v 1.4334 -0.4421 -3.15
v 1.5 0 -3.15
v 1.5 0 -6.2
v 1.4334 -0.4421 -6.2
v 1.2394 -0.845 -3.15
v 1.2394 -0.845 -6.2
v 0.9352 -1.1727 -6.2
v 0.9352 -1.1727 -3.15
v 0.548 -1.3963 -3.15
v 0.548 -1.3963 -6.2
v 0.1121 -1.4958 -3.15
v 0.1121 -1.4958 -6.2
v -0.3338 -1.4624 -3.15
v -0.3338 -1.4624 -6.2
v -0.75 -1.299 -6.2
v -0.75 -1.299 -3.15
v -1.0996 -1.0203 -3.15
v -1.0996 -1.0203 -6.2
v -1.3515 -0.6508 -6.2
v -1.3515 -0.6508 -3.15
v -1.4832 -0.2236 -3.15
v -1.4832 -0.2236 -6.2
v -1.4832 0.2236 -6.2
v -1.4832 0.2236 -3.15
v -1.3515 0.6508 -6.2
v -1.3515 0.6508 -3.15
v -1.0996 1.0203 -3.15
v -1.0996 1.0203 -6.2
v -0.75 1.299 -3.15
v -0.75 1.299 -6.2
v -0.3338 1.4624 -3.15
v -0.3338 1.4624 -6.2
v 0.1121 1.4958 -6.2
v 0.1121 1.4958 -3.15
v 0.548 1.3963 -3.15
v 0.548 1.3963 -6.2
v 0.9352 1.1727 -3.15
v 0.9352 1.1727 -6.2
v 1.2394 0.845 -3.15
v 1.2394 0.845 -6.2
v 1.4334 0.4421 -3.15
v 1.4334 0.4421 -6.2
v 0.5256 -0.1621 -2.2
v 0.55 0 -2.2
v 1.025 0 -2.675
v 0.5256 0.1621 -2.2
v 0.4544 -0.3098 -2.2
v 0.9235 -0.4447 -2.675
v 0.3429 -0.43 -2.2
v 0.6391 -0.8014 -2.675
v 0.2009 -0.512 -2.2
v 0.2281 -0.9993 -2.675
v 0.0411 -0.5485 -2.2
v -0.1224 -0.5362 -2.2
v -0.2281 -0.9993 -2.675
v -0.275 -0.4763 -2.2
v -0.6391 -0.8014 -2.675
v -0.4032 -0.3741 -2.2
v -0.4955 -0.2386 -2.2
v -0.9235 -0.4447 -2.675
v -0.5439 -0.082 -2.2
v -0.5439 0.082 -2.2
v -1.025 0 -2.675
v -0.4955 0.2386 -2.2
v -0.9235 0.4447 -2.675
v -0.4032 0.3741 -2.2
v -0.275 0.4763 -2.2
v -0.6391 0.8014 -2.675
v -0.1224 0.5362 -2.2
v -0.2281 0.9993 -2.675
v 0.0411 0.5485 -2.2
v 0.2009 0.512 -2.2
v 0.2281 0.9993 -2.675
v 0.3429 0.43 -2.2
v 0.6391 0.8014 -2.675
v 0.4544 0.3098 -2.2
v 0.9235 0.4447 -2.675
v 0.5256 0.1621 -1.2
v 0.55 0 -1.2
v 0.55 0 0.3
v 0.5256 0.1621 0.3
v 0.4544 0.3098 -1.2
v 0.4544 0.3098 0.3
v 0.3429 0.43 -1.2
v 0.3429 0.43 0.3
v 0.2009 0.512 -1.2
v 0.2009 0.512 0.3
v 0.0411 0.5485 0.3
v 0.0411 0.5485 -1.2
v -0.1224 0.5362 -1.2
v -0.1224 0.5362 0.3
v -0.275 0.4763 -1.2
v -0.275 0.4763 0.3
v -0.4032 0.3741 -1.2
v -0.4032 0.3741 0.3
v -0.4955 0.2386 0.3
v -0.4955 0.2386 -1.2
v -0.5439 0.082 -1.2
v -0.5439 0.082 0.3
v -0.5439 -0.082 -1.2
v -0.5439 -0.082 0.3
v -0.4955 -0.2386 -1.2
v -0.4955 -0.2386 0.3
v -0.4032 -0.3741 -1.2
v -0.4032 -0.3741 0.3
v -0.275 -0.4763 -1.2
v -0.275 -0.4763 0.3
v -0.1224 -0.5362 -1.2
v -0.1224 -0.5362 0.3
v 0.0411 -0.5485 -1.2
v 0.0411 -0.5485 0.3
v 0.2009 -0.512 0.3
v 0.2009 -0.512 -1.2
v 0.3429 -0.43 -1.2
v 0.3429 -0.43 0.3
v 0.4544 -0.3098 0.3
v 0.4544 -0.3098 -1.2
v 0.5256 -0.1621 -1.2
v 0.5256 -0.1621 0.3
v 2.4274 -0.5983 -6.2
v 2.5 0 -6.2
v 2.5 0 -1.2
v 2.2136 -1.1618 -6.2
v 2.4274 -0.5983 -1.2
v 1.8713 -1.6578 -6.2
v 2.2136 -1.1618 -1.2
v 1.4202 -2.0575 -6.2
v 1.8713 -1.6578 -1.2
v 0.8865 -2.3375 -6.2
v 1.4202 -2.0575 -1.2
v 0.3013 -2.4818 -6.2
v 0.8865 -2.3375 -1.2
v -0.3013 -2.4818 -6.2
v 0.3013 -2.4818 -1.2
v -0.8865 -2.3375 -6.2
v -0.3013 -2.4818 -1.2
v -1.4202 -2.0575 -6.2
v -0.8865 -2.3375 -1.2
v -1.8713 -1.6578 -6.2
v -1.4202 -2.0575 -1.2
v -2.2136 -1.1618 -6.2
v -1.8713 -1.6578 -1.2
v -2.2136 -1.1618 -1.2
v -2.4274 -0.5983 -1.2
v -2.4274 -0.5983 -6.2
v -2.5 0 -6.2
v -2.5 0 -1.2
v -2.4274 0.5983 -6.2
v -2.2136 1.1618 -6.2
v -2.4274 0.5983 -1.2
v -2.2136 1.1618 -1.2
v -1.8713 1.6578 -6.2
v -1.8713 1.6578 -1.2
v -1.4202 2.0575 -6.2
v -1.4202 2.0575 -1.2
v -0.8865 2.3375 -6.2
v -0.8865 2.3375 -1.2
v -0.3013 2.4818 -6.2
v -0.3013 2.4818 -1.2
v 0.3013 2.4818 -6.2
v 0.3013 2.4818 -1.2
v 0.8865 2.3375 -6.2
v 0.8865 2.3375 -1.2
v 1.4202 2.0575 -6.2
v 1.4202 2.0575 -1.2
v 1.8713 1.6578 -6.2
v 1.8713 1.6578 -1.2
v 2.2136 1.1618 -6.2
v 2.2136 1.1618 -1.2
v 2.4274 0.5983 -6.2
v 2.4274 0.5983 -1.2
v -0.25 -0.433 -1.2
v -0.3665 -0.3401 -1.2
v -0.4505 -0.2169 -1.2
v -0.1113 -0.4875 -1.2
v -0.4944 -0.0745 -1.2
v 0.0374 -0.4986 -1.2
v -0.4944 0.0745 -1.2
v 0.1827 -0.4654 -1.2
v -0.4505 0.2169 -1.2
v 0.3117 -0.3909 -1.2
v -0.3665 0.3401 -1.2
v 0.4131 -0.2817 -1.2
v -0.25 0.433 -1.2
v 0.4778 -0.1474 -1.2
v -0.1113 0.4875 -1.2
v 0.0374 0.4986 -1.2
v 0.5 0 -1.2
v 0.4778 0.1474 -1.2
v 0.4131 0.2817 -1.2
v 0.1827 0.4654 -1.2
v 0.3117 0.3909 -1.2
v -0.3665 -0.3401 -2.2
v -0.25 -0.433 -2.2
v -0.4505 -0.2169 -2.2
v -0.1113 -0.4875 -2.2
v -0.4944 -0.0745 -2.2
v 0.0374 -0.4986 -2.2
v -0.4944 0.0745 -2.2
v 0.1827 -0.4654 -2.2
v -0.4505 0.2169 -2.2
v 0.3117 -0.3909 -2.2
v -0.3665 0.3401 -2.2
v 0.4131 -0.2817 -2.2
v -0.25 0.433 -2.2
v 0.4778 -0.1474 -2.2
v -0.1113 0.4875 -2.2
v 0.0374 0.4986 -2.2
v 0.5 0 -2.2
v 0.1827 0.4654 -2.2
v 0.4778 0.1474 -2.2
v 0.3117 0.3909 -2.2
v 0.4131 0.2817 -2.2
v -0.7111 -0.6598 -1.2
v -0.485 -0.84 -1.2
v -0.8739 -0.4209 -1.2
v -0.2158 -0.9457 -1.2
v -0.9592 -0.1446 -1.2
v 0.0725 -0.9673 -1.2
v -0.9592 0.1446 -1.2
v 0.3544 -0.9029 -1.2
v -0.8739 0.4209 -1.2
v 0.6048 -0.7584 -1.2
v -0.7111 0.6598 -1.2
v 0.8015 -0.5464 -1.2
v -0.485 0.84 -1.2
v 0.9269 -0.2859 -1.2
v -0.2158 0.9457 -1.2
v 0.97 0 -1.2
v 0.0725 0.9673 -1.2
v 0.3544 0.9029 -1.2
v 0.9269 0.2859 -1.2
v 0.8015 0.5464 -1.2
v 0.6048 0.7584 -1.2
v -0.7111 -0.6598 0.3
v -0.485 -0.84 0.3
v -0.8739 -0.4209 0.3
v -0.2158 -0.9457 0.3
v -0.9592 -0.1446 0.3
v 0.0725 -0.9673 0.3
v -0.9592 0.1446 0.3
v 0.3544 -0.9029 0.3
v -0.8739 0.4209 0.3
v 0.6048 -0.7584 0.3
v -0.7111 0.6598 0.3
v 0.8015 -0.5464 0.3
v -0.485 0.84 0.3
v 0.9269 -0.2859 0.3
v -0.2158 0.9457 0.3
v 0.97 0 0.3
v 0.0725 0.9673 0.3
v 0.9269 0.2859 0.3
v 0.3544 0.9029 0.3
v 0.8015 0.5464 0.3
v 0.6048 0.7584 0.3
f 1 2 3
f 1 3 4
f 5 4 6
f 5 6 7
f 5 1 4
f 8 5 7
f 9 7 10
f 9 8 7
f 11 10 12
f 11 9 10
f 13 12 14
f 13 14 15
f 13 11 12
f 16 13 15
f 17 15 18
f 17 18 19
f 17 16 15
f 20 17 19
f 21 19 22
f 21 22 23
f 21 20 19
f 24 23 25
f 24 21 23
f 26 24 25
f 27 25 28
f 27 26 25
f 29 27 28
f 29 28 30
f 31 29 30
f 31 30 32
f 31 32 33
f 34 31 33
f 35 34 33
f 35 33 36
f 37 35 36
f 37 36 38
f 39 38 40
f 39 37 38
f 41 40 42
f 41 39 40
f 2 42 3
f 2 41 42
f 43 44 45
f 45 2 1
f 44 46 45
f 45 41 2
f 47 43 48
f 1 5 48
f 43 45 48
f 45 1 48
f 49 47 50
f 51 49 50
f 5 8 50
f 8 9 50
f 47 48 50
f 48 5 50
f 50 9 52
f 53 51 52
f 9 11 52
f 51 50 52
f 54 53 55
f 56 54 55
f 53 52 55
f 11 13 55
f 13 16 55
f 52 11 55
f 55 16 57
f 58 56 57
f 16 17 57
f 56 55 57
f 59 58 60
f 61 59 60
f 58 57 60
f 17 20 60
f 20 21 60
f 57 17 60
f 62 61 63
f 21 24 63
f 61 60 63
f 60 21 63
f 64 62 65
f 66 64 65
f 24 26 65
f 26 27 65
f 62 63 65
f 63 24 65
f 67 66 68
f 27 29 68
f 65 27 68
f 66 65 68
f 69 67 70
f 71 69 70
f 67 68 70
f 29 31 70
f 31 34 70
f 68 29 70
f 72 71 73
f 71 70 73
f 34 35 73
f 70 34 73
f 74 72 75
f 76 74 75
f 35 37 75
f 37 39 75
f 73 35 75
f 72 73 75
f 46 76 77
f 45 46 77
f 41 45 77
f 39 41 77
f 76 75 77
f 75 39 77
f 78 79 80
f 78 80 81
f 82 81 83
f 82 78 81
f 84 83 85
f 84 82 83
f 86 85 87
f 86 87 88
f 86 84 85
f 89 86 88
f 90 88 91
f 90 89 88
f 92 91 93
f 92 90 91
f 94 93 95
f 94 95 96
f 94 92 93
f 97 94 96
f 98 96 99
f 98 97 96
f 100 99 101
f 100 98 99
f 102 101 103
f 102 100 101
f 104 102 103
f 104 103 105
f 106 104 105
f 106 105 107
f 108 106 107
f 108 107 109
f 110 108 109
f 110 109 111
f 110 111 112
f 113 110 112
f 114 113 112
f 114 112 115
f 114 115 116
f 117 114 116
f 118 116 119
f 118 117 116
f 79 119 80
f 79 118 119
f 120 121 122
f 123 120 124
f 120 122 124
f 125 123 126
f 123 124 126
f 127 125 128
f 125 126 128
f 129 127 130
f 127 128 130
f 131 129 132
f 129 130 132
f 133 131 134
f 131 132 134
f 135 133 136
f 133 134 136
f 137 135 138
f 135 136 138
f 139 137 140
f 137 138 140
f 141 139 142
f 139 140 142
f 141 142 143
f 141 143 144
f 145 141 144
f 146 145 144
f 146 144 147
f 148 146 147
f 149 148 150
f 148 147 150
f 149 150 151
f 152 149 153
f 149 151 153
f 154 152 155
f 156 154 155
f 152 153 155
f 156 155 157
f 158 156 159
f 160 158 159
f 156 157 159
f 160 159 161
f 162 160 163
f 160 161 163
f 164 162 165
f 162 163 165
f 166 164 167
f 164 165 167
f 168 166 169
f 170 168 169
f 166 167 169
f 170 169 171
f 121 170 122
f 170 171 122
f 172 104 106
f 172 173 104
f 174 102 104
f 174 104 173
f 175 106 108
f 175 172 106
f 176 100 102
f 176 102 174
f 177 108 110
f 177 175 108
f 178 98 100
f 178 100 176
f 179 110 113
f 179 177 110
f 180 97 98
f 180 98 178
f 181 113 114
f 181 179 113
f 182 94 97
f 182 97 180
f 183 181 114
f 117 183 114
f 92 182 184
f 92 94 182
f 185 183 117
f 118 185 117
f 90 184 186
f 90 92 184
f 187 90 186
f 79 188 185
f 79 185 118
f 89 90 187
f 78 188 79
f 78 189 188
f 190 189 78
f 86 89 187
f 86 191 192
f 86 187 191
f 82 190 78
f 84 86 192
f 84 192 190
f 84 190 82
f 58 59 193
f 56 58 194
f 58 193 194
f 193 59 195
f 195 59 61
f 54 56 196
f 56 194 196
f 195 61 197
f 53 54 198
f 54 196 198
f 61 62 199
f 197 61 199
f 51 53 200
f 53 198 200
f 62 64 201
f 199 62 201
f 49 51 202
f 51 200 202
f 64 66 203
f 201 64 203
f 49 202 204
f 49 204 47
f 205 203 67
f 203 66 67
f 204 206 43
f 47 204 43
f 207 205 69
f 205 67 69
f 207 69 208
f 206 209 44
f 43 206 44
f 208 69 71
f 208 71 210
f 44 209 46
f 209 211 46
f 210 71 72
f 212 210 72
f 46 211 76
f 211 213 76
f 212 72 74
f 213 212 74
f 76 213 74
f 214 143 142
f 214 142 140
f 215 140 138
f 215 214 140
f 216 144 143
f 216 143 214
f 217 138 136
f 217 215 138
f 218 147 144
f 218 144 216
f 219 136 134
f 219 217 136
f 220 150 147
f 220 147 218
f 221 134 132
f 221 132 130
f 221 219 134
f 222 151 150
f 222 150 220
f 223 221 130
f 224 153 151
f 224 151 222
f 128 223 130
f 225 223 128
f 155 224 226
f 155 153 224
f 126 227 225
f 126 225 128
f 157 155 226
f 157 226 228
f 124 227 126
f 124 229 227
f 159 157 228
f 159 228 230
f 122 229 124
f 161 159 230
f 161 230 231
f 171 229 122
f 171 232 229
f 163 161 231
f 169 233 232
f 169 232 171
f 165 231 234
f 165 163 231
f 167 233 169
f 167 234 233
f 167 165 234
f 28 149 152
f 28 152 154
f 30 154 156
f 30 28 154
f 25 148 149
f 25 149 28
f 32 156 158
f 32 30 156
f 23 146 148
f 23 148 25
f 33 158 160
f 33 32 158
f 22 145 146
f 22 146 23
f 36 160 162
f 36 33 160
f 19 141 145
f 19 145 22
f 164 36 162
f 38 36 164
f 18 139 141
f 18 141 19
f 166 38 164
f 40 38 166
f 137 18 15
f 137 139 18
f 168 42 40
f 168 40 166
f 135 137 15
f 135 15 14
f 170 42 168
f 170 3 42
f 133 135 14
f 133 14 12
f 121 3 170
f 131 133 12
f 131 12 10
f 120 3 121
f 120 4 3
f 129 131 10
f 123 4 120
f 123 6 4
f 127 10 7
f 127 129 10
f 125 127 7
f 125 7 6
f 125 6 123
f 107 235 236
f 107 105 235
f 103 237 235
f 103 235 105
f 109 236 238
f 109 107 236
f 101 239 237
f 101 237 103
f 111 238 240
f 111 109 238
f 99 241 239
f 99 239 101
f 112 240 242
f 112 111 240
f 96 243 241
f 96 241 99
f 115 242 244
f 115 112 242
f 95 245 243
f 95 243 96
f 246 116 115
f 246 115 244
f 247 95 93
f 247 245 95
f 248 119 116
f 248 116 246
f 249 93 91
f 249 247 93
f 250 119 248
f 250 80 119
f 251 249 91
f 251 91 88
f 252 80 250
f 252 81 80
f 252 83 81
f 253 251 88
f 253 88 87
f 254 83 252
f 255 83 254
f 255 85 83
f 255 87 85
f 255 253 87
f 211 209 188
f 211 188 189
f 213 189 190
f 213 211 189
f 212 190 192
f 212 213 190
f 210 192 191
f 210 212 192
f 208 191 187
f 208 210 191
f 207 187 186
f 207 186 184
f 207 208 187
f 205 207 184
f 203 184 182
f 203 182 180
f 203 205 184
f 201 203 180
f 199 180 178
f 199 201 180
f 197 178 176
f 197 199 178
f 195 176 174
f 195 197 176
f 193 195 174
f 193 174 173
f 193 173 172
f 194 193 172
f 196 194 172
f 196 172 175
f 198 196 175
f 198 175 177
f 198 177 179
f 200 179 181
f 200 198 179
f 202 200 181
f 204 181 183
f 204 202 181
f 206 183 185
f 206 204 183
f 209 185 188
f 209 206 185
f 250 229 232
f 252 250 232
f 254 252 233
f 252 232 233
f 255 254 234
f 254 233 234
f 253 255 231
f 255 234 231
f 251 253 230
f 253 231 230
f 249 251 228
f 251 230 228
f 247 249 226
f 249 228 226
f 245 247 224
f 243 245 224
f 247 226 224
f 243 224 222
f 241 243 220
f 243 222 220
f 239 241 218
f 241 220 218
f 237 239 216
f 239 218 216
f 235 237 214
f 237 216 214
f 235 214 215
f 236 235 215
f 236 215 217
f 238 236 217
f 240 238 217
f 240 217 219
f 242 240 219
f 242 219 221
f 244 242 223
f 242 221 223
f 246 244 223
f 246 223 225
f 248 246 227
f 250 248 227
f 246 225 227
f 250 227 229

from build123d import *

# Parameters (mm, degrees)
SKETCH283_R     = 2.5
SKETCH283_R_2   = 0.5
PAD192_DEPTH    = 1
SKETCH277_R     = 0.97
SKETCH277_R_2   = 0.55
PAD187_DEPTH    = 1.5
SKETCH309_R     = 2.5
SKETCH309_R_2   = 1.5
PAD214_DEPTH    = 4
CHAMFER006_SIZE = 0.95


with BuildPart() as part:
    # Sketch283 → Pad192 (new body)
    with BuildSketch(Plane.XY):
        Circle(SKETCH283_R)
        Circle(SKETCH283_R_2, mode=Mode.SUBTRACT)
    extrude(amount=PAD192_DEPTH)

    # Sketch277 (on Face4 of Pad192) → Pad187 (join)
    with BuildSketch(Plane.XY.offset(1)):
        Circle(SKETCH277_R)
        Circle(SKETCH277_R_2, mode=Mode.SUBTRACT)
    extrude(amount=PAD187_DEPTH)

    # Sketch309 (on Face2 of Pad187) → Pad214 (join)
    with BuildSketch(Plane(origin=(0, 0, 0), x_dir=(1, 0, 0), z_dir=(0, 0, -1))):
        Circle(SKETCH309_R)
        Circle(SKETCH309_R_2, mode=Mode.SUBTRACT)
    extrude(amount=PAD214_DEPTH)

    # Chamfer006
    chamfer006_edges = [part.edges().sort_by_distance(p)[0] for p in [
        (-1.5, 0, 0),
    ]]
    chamfer(chamfer006_edges, length=CHAMFER006_SIZE)


with BuildPart() as part_1:
    # Body056 placement: moved
    add(part.part.moved(Location((0, 0, -2.2))))


solid = part_1.part
